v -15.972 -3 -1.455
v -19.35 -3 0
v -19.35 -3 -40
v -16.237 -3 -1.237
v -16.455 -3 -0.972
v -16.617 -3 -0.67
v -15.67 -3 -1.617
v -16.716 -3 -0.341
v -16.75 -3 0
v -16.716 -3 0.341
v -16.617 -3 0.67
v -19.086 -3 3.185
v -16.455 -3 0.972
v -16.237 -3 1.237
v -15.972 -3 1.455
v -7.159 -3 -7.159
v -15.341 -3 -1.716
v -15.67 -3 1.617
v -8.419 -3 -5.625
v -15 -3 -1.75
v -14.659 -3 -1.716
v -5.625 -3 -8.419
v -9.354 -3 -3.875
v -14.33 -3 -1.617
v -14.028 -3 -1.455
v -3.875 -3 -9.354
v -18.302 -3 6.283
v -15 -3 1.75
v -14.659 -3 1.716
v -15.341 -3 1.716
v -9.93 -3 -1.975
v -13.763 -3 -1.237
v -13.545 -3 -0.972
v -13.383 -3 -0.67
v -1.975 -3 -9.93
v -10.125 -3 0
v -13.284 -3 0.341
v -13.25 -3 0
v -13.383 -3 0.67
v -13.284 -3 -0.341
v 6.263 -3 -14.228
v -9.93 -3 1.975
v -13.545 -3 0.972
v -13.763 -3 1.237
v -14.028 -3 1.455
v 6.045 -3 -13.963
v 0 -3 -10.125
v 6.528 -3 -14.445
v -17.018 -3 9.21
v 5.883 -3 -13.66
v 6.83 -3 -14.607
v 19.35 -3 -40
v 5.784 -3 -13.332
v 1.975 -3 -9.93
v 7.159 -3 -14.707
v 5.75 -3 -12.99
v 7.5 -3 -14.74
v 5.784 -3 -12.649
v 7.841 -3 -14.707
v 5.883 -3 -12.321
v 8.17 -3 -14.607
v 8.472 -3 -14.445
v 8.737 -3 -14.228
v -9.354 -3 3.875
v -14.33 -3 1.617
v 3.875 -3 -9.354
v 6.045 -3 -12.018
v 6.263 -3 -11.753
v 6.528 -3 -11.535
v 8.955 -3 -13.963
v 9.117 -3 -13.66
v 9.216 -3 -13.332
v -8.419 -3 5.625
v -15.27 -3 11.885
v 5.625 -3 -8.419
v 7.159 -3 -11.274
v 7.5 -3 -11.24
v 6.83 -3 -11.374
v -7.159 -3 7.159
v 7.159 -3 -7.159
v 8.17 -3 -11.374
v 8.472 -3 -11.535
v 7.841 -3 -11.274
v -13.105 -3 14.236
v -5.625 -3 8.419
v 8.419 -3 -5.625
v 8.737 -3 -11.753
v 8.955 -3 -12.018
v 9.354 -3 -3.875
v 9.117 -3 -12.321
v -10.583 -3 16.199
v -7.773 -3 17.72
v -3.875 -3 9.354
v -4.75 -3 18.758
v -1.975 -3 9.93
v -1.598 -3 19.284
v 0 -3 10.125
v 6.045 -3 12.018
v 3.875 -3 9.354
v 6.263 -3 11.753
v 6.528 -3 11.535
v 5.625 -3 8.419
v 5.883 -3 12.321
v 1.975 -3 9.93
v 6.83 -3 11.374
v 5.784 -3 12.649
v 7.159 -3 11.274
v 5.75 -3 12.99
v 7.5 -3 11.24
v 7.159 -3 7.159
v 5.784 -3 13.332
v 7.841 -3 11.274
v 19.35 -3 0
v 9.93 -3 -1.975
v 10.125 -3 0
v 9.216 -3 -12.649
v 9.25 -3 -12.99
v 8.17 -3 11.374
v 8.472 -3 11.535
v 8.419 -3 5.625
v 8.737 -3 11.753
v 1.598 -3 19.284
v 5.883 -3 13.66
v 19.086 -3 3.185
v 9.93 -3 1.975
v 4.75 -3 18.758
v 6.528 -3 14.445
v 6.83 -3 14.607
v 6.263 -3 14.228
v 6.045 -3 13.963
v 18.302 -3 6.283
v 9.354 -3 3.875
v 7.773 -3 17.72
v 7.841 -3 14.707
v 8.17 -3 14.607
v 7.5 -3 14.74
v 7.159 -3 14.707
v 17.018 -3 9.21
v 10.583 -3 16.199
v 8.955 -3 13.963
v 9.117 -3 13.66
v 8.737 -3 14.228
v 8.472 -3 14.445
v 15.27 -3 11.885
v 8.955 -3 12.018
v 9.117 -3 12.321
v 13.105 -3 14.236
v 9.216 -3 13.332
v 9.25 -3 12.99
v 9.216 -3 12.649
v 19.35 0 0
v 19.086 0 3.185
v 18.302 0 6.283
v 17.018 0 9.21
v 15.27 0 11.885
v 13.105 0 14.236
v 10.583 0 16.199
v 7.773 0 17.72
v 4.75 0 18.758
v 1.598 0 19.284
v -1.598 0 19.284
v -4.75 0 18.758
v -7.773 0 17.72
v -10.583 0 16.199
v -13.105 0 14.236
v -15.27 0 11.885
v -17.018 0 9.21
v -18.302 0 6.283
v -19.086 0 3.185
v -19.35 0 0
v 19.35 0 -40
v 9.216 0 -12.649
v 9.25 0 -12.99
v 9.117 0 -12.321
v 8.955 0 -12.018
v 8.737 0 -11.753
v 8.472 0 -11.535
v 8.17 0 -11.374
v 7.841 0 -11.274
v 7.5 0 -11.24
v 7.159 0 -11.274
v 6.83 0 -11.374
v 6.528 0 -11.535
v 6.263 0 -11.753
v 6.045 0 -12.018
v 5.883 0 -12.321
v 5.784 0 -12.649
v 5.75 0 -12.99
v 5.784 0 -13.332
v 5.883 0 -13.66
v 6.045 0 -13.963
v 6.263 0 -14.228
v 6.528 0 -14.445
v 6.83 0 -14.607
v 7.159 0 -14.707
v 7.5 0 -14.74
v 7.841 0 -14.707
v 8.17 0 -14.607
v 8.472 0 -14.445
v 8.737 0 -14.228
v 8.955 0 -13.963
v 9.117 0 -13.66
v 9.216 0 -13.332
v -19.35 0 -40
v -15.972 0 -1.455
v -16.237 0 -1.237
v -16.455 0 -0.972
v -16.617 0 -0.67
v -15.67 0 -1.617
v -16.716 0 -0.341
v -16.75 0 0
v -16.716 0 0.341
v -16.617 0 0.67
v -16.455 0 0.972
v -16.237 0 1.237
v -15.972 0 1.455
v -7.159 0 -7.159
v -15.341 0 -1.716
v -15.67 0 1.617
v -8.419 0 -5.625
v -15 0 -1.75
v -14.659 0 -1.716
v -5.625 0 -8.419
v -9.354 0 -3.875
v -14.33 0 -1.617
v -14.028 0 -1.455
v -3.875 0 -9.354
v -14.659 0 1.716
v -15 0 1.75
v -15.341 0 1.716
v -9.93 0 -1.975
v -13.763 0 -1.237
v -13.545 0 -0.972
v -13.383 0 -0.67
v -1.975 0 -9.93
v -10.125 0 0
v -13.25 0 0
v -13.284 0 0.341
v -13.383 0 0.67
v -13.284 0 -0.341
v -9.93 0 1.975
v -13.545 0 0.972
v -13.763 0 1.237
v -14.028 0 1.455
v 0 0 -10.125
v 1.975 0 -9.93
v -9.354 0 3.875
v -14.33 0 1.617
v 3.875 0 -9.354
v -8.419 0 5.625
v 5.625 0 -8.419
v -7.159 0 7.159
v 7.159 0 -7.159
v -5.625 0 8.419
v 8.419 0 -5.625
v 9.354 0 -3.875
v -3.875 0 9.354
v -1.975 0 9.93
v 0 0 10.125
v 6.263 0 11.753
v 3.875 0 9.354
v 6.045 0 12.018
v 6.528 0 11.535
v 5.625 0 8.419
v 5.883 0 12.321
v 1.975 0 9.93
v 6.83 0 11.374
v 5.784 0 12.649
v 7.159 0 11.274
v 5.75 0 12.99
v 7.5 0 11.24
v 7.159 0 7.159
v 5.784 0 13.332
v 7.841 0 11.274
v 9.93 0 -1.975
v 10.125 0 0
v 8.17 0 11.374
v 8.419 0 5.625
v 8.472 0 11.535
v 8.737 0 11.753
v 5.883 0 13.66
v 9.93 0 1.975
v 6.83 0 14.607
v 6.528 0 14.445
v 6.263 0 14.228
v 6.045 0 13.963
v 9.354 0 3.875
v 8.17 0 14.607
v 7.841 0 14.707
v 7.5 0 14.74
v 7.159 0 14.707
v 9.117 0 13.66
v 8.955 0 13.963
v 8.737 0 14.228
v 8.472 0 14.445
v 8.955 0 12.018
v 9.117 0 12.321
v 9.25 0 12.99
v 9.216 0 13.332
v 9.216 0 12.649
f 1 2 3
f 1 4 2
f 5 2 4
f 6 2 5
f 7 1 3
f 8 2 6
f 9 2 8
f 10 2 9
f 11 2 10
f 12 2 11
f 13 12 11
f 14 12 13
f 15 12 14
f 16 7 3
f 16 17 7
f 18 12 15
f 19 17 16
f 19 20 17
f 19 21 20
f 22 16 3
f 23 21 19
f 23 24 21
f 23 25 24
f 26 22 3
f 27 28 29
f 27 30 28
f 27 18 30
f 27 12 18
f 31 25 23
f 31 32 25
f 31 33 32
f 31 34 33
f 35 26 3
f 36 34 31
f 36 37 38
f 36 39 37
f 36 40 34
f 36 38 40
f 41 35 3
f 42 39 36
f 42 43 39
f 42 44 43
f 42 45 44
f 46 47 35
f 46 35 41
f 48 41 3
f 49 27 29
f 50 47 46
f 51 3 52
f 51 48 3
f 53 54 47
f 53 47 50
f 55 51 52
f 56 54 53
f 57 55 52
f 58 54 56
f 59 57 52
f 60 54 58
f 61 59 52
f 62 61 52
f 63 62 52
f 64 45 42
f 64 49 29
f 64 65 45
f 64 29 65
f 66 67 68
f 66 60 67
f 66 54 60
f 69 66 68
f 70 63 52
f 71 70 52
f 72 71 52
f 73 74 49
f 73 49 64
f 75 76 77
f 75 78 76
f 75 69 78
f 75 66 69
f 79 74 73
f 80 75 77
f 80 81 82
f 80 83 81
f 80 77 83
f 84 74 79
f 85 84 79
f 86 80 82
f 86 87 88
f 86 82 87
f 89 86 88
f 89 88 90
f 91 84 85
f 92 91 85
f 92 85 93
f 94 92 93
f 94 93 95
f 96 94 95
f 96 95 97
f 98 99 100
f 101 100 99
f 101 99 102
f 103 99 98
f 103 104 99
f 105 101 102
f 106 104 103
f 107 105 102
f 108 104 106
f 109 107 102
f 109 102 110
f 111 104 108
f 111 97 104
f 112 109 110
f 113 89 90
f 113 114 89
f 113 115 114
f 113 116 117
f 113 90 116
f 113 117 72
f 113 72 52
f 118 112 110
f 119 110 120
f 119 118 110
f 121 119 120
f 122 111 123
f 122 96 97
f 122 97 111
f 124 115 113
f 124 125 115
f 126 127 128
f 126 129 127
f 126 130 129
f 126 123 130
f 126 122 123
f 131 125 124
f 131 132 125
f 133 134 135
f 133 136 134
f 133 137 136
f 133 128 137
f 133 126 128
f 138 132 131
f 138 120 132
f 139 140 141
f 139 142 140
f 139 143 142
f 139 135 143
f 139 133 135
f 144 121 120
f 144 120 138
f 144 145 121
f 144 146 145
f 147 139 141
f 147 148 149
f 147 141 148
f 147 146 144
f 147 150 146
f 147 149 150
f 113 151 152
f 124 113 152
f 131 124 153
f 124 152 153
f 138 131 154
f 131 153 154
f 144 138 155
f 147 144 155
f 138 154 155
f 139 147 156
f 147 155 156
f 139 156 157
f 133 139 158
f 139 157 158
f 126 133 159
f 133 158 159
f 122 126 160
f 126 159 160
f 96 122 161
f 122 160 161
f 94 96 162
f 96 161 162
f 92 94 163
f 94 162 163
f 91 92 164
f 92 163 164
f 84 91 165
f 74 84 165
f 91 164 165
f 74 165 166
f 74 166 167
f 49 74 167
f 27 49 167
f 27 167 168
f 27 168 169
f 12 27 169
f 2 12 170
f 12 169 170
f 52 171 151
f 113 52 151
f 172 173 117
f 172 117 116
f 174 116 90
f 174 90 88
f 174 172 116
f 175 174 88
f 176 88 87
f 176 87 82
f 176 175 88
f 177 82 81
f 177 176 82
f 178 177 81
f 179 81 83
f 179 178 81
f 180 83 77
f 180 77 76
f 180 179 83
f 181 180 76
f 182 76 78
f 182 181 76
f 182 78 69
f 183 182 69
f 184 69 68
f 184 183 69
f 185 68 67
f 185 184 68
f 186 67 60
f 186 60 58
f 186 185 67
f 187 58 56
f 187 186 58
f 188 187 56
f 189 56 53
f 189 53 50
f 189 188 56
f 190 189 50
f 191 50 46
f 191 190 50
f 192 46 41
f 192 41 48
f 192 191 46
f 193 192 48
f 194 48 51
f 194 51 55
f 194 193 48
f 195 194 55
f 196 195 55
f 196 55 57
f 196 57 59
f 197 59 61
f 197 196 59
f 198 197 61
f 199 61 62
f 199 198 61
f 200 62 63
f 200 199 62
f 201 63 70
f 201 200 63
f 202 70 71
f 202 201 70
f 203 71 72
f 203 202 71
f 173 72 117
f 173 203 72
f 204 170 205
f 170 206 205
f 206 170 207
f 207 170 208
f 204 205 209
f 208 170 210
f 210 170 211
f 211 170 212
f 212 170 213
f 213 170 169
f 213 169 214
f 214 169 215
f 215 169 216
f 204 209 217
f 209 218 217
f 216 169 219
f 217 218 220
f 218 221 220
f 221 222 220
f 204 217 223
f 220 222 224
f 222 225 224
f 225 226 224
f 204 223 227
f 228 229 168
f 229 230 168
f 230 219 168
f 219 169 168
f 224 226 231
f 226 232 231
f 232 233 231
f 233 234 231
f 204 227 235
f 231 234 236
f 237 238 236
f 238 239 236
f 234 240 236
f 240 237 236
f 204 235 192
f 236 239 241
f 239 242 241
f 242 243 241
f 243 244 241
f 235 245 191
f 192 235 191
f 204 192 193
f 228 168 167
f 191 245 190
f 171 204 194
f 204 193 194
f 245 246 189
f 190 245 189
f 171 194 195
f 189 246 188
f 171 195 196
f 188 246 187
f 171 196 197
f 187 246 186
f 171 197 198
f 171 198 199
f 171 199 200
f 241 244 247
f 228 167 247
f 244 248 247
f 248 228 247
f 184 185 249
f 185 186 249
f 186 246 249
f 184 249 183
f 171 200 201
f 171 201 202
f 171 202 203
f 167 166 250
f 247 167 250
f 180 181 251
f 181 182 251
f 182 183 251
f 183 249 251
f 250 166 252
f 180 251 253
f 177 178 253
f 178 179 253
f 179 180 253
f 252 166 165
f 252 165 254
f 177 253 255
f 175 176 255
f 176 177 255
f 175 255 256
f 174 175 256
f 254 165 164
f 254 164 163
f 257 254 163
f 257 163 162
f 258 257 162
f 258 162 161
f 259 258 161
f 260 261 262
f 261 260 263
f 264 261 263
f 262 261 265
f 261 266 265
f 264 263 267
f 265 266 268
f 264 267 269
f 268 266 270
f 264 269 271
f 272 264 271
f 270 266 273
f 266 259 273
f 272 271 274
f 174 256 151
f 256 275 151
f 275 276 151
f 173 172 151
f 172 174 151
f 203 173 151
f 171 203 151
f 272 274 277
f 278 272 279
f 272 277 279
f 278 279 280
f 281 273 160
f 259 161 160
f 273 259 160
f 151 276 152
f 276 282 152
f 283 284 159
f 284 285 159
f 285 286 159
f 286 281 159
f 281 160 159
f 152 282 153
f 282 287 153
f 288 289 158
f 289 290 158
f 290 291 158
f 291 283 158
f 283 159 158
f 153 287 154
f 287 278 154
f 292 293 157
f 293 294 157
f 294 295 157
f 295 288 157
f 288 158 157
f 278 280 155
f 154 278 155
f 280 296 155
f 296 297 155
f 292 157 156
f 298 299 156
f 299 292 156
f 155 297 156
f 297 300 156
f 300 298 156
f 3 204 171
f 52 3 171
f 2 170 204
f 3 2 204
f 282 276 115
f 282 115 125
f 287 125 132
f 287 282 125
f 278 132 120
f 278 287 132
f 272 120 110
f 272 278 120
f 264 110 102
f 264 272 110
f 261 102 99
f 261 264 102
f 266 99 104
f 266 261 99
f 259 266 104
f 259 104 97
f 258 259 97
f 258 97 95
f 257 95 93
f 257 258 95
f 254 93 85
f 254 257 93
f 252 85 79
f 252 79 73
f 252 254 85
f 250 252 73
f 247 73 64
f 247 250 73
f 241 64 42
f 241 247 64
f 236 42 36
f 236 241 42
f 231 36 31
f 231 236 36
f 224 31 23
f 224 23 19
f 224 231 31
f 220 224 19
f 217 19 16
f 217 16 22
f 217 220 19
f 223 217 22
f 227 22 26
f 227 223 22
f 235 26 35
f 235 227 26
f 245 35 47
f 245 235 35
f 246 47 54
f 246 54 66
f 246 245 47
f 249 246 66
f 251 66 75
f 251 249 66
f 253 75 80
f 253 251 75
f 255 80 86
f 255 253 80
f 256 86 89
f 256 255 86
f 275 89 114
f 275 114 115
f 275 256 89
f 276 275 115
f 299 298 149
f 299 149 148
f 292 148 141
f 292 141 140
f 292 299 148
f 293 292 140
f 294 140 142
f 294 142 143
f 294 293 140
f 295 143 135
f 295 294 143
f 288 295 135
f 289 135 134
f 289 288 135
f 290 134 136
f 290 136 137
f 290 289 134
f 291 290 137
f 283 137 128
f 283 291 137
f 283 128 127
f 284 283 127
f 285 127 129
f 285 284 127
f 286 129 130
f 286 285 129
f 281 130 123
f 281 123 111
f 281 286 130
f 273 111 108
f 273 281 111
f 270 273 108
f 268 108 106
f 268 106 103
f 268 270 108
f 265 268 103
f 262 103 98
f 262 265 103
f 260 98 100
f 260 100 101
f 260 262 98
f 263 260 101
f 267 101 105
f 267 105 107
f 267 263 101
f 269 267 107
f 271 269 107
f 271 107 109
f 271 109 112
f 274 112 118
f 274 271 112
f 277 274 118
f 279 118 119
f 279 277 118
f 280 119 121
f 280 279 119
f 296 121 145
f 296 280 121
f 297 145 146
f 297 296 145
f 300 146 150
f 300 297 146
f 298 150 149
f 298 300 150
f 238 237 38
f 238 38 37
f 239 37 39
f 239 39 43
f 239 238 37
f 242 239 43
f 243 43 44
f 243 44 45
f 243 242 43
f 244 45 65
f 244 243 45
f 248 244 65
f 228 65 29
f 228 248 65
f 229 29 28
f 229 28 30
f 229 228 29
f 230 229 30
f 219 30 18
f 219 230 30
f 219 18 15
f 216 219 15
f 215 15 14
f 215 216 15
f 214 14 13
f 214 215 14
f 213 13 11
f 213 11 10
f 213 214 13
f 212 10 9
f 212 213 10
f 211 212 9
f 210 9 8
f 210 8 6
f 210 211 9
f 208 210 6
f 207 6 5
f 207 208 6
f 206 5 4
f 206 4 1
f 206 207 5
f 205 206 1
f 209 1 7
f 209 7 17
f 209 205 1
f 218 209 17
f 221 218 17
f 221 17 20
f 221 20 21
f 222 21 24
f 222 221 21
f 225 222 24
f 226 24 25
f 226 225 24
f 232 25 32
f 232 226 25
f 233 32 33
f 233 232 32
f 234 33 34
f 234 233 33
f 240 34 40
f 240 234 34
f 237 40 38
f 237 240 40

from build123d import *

# Parameters (mm, degrees)
SKETCH_R   = 10.125
SKETCH_R_2 = 1.75
PAD_DEPTH  = 3


with BuildPart() as part:
    # Sketch → Pad (new body)
    with BuildSketch(Plane.XZ):
        with BuildLine():
            ThreePointArc((19.35, -3e-06), (0, 19.35), (-19.35, -3e-06))
            Line((-19.35, -3e-06), (-19.35, -40.000003))
            Line((-19.35, -40.000003), (19.35, -40.000003))
            Line((19.35, -40.000003), (19.35, -3e-06))
        make_face()
        Circle(SKETCH_R, mode=Mode.SUBTRACT)
        with Locations((7.500003, 12.990379)):
            Circle(SKETCH_R_2, mode=Mode.SUBTRACT)
        with Locations((-15, 5e-06)):
            Circle(SKETCH_R_2, mode=Mode.SUBTRACT)
        with Locations((7.499994, -12.990384)):
            Circle(SKETCH_R_2, mode=Mode.SUBTRACT)
    extrude(amount=PAD_DEPTH)


solid = part.part
